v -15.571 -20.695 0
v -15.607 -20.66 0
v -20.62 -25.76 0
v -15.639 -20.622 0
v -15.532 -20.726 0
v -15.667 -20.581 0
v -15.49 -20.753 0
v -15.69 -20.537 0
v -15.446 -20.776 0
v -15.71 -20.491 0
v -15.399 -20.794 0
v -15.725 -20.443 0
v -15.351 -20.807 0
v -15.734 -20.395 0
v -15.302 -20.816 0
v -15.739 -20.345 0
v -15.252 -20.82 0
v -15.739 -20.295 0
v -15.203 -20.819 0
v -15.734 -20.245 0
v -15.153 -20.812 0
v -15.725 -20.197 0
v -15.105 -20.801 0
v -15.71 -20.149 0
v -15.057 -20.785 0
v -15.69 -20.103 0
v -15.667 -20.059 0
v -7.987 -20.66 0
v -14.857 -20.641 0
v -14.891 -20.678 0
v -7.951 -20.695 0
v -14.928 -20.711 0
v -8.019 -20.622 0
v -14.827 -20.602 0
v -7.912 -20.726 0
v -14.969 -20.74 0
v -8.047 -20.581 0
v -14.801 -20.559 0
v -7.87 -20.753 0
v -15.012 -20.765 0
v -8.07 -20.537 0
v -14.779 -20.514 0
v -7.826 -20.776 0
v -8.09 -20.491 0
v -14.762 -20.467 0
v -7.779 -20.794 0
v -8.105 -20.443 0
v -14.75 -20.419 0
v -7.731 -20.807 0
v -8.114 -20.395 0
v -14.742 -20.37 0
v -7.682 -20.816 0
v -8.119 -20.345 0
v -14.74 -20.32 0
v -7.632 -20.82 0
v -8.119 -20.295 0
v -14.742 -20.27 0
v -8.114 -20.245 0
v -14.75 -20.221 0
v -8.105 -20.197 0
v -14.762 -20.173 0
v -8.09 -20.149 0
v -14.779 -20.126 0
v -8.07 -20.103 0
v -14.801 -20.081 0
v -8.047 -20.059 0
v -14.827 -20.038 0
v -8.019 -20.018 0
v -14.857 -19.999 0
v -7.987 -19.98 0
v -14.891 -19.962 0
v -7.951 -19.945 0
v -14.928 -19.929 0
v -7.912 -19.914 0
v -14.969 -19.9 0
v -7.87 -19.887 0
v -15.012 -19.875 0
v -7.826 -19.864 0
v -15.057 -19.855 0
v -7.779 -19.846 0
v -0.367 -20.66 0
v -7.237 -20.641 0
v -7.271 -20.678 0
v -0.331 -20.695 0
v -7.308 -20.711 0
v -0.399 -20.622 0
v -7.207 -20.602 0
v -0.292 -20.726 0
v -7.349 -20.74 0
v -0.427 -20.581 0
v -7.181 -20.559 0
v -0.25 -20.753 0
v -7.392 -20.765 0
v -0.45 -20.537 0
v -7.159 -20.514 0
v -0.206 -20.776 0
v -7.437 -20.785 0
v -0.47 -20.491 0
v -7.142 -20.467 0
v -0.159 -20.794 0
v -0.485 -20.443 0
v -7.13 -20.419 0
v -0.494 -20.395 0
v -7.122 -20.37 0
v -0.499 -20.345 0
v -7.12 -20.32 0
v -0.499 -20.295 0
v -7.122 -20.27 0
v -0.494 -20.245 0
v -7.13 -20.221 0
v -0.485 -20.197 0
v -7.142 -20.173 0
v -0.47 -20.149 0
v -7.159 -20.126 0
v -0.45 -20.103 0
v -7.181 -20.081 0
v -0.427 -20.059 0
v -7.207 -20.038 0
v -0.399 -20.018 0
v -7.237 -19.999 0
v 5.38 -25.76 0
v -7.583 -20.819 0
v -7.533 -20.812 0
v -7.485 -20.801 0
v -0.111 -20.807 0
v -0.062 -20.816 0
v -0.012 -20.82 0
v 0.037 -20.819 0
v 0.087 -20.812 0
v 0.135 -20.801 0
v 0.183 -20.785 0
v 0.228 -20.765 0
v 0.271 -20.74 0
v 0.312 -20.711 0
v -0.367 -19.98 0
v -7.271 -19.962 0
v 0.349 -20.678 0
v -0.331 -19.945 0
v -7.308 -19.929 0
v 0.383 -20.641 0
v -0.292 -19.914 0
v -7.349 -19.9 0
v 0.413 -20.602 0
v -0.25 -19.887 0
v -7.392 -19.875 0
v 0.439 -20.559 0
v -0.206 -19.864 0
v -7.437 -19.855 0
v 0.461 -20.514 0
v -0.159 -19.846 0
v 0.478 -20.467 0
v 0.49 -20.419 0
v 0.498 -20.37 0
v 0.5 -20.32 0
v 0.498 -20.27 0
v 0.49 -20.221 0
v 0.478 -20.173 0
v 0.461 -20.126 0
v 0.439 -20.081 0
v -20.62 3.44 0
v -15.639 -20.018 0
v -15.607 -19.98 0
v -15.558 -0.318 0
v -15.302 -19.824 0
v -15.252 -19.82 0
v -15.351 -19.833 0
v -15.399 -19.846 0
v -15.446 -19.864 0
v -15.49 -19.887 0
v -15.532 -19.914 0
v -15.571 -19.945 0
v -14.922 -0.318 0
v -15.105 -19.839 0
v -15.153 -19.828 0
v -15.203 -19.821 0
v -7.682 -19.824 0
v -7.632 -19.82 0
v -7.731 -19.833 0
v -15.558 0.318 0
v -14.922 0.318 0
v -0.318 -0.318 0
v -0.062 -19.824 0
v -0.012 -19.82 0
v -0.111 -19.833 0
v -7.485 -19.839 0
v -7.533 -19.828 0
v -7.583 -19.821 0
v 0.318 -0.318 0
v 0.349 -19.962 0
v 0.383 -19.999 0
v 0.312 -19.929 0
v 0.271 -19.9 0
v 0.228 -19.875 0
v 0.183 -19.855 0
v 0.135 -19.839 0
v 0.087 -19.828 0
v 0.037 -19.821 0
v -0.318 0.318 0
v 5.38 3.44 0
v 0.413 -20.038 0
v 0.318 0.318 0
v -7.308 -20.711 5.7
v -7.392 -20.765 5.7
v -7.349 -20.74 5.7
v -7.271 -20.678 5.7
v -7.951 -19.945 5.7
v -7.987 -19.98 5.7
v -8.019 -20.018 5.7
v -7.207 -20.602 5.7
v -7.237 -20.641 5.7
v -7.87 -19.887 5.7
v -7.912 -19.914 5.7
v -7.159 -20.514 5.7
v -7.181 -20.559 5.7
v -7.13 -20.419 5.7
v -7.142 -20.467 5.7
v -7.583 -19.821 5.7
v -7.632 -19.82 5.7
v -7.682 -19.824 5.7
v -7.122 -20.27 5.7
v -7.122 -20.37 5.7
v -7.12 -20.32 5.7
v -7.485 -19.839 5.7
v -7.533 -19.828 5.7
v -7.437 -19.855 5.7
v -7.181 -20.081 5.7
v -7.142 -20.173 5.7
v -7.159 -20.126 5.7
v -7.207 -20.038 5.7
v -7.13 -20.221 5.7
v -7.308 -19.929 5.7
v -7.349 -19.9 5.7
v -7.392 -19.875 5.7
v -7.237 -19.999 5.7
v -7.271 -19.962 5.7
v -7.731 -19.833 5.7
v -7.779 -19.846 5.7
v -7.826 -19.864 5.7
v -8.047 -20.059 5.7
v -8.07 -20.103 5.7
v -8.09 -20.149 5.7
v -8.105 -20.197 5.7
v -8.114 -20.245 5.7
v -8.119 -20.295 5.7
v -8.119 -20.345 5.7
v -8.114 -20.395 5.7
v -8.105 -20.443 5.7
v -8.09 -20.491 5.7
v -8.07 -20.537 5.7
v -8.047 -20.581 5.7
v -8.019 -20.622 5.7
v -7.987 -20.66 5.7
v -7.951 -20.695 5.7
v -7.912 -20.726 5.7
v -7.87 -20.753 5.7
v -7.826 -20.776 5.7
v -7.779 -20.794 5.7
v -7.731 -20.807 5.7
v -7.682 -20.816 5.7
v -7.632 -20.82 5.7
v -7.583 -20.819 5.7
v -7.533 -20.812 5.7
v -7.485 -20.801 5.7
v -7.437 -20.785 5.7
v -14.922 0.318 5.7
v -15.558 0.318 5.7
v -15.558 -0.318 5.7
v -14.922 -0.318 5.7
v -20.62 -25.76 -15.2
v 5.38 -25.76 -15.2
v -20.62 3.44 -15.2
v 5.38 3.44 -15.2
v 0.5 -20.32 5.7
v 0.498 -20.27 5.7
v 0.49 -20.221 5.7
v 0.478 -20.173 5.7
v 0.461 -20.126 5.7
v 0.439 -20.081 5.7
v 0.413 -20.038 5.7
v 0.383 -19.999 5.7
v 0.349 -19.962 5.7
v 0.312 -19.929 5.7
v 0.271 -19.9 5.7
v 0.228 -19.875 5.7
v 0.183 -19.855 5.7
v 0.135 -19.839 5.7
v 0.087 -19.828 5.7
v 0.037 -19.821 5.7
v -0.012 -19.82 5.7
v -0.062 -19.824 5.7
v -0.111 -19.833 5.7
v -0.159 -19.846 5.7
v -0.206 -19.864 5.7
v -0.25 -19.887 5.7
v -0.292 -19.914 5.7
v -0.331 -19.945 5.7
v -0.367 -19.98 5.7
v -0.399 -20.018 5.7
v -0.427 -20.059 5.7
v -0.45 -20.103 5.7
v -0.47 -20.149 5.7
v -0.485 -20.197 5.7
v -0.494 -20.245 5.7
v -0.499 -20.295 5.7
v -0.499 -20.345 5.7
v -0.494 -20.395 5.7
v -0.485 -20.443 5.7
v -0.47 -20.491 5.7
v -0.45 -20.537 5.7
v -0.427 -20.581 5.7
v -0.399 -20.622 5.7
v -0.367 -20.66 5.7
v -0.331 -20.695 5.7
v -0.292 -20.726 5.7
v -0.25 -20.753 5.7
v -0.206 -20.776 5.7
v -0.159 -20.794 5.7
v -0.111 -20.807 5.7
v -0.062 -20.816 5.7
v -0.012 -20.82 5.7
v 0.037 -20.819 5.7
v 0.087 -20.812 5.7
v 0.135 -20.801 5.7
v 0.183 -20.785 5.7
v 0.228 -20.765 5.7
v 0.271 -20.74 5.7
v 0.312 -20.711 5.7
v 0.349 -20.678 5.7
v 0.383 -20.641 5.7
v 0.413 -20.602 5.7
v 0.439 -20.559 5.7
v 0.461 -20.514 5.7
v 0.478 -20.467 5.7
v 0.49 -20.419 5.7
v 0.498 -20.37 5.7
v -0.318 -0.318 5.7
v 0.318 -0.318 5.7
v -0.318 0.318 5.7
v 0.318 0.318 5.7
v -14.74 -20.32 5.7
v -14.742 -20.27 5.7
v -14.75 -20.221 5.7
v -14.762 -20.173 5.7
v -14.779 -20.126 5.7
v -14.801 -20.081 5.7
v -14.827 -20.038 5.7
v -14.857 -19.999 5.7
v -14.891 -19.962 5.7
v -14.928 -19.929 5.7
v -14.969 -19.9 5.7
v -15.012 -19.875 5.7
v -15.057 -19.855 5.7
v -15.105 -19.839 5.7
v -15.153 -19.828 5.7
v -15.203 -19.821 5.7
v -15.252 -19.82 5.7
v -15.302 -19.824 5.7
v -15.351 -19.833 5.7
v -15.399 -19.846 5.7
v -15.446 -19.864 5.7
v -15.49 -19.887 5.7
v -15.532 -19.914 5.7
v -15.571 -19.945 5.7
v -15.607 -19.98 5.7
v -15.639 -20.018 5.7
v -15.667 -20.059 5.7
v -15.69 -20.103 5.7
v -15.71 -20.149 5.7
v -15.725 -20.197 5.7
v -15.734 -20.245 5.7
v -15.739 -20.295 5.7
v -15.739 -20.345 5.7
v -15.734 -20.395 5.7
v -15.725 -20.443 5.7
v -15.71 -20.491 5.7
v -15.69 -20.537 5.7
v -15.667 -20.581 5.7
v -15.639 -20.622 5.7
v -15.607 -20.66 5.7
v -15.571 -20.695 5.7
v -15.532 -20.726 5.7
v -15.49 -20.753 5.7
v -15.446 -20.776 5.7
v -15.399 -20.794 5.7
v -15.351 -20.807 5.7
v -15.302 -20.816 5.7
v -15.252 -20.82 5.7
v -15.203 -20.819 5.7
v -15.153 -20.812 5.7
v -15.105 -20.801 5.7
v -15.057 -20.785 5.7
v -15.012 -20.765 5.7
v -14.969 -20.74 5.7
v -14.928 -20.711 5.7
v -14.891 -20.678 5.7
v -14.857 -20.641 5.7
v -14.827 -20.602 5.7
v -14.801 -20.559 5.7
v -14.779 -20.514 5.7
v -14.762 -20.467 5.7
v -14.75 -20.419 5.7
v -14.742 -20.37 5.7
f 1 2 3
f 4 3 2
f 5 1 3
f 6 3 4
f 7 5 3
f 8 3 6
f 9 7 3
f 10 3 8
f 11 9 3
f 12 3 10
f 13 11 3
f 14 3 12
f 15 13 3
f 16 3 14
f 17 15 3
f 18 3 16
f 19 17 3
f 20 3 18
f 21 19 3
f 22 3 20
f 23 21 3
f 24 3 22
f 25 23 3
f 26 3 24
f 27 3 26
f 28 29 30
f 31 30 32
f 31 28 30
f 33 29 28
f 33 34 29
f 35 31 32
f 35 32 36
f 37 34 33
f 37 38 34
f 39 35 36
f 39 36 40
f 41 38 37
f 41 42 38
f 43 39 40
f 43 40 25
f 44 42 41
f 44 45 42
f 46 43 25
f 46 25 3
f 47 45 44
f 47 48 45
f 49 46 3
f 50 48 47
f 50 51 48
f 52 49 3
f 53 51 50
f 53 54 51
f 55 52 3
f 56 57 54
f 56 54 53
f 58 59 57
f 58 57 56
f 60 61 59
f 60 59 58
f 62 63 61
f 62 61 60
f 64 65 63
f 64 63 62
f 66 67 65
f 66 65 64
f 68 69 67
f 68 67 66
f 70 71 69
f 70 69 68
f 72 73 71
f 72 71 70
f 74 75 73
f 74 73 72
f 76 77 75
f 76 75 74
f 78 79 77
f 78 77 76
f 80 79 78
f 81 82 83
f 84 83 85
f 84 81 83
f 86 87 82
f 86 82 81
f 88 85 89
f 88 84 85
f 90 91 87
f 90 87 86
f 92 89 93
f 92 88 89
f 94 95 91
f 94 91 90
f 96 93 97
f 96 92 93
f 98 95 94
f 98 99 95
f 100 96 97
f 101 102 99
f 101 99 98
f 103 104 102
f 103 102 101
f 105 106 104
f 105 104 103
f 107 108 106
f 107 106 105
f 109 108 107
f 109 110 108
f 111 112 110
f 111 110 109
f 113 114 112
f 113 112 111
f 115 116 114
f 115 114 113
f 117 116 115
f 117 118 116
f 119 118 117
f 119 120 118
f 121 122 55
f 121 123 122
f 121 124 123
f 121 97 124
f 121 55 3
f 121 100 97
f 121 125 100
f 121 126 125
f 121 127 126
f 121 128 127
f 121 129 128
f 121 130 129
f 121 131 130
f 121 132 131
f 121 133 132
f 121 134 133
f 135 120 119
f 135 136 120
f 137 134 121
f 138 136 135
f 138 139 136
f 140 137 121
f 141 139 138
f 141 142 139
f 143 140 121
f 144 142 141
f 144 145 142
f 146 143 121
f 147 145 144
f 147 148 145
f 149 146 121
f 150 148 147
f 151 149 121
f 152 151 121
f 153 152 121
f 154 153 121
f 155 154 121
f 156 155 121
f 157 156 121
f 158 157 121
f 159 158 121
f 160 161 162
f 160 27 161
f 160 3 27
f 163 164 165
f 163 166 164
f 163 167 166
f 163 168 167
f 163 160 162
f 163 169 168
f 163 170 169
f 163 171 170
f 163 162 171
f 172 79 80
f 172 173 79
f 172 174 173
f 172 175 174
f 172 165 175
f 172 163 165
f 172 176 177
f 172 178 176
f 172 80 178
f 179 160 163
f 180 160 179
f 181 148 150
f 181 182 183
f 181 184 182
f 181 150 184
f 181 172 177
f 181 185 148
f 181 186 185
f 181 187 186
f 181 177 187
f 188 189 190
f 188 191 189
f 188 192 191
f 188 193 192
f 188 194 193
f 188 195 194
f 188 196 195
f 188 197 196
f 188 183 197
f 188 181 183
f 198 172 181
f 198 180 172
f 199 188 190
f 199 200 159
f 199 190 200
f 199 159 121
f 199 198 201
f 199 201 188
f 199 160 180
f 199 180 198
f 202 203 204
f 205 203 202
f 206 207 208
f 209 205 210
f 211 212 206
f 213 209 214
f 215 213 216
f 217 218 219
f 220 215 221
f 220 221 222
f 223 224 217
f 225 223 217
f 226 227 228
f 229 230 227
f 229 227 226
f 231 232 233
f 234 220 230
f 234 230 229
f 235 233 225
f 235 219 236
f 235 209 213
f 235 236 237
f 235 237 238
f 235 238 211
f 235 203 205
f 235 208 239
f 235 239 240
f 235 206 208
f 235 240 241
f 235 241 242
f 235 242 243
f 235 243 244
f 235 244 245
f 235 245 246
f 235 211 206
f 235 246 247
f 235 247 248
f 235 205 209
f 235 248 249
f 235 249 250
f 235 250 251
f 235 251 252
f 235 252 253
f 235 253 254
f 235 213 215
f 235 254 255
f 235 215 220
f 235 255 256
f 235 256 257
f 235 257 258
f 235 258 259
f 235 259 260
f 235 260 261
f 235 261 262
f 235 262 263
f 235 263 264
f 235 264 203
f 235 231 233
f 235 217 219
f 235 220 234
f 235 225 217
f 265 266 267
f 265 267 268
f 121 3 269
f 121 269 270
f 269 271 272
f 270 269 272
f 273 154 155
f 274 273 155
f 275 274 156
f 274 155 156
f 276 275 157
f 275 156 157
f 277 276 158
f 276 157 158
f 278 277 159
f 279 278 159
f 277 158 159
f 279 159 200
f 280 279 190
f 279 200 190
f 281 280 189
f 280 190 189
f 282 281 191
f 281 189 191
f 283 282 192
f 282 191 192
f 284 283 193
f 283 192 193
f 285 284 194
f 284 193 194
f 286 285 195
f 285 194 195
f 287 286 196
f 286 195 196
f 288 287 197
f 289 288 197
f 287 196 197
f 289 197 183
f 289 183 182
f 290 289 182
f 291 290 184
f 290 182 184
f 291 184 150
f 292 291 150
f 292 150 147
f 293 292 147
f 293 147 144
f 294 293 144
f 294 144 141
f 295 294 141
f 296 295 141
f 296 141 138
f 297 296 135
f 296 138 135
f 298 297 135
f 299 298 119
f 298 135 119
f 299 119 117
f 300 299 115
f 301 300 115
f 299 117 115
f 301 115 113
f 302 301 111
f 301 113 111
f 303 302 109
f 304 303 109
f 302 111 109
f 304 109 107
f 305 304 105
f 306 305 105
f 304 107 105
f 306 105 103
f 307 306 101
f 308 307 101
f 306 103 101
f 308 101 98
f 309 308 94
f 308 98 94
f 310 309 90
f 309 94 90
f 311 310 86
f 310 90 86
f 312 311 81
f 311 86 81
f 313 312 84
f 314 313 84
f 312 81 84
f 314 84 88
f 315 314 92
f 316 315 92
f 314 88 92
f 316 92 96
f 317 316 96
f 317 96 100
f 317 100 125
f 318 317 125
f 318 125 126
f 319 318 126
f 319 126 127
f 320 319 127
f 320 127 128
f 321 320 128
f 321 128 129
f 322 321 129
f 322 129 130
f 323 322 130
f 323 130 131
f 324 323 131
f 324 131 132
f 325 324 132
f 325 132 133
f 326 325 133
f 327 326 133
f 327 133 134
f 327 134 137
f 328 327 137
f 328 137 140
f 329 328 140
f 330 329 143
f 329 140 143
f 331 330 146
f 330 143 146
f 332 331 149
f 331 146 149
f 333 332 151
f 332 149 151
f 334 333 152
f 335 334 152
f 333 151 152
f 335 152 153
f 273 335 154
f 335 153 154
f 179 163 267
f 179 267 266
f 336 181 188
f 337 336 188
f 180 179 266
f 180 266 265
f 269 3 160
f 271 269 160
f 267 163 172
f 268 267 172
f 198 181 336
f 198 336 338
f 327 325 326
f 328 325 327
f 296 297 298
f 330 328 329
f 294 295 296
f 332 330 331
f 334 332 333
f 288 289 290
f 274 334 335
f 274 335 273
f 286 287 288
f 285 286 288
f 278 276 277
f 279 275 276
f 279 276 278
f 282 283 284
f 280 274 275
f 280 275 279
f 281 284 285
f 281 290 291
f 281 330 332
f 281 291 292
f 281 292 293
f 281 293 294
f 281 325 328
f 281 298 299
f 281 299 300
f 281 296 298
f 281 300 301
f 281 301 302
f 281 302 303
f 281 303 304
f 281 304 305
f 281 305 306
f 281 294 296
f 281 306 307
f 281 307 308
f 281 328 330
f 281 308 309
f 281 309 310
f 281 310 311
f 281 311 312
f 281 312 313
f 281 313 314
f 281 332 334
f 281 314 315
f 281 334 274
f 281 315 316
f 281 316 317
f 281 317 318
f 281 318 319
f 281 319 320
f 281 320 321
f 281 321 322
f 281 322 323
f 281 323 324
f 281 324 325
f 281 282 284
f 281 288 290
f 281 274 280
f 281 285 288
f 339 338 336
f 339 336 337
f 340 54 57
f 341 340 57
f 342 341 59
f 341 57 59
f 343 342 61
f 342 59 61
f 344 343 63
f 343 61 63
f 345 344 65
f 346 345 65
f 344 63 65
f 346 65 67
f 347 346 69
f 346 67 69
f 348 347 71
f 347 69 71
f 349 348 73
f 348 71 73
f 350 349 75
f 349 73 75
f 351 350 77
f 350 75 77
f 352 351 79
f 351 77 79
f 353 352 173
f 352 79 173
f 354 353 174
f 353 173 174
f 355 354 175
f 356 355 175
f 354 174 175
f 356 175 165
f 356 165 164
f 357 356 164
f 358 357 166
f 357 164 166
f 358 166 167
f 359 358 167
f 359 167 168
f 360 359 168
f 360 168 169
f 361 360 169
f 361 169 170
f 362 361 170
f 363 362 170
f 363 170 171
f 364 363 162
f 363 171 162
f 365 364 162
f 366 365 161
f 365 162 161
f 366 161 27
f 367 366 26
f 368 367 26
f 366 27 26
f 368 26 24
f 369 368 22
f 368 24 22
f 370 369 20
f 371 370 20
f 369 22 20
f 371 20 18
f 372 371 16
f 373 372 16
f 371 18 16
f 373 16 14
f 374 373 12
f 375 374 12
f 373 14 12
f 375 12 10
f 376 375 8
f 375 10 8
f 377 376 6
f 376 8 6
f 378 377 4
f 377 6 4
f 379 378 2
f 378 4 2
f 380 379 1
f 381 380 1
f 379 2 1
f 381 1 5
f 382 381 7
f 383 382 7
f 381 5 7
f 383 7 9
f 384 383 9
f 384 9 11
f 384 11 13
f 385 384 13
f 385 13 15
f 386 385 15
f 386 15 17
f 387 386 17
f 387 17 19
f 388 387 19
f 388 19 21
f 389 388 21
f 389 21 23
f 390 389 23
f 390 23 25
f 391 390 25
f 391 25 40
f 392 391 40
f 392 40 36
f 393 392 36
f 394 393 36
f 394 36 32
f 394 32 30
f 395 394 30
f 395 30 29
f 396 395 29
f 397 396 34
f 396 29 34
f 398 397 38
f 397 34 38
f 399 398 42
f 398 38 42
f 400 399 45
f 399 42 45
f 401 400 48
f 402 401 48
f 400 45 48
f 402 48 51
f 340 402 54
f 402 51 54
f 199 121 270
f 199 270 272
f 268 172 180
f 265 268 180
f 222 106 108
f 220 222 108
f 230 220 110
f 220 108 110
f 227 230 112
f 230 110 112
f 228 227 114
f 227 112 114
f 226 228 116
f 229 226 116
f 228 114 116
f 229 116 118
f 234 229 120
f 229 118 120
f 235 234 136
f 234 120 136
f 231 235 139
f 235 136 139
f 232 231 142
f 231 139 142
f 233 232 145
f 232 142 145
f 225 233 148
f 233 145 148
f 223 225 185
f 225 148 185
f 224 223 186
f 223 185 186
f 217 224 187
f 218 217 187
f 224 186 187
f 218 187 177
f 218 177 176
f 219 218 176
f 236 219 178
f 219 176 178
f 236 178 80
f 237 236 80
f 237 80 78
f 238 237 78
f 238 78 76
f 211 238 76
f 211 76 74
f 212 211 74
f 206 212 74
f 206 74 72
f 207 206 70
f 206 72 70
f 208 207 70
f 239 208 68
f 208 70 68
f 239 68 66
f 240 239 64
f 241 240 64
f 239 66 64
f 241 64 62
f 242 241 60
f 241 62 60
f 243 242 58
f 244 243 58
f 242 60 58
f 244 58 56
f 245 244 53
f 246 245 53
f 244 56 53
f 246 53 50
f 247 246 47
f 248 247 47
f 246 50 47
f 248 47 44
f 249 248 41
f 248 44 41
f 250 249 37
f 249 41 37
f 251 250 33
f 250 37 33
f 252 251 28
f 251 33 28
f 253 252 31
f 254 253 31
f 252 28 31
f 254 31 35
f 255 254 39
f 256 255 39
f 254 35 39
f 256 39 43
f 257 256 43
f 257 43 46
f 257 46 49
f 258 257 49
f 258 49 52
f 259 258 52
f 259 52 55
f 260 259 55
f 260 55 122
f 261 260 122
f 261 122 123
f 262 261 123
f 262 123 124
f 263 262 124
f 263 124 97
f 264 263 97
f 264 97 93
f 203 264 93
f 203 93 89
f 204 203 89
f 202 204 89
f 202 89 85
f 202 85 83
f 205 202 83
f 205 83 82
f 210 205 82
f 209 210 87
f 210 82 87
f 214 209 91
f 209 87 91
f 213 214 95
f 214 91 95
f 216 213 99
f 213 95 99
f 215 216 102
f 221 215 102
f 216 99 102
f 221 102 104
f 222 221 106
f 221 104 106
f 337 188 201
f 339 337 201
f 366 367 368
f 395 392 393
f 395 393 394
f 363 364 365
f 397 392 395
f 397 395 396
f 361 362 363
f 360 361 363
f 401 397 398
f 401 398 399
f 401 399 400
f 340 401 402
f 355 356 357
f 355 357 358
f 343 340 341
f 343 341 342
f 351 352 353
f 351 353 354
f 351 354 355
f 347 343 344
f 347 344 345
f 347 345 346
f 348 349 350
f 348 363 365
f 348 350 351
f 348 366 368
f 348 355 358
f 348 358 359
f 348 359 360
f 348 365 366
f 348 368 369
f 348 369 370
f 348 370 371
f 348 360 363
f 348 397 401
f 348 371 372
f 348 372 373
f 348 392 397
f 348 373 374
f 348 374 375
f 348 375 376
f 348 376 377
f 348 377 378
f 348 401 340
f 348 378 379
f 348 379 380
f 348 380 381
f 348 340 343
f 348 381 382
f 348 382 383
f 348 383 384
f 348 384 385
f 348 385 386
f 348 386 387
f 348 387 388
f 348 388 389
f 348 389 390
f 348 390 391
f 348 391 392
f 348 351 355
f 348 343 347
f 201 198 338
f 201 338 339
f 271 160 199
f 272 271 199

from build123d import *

# Parameters (mm, degrees)
SKETCH_W         = 26
SKETCH_H         = 29.2
EXTRUDE_DEPTH    = 15.2
SKETCH001_R      = 0.5
SKETCH001_W      = 0.635
SKETCH001_H      = 0.635
EXTRUDE001_DEPTH = 5.7


with BuildPart() as extrude_body:
    # Sketch → Extrude (new body)
    with BuildSketch(Plane.XY):
        with Locations((-7.62, -11.16)):
            Rectangle(SKETCH_W, SKETCH_H)
    extrude(amount=-EXTRUDE_DEPTH)


with BuildPart() as fusion:
    # Sketch001 → Extrude001 (new body)
    with BuildSketch(Plane.XY):
        with Locations((-15.24, -20.32)):
            Circle(SKETCH001_R)
        with Locations((-7.62, -20.32)):
            Circle(SKETCH001_R)
        with Locations((0, -20.32)):
            Circle(SKETCH001_R)
        Rectangle(SKETCH001_W, SKETCH001_H)
        with Locations((-15.24, 0)):
            Rectangle(SKETCH001_W, SKETCH001_H)
    extrude(amount=EXTRUDE001_DEPTH)

    # Fusion: union Extrude body
    add(extrude_body.part)


solid = fusion.part
